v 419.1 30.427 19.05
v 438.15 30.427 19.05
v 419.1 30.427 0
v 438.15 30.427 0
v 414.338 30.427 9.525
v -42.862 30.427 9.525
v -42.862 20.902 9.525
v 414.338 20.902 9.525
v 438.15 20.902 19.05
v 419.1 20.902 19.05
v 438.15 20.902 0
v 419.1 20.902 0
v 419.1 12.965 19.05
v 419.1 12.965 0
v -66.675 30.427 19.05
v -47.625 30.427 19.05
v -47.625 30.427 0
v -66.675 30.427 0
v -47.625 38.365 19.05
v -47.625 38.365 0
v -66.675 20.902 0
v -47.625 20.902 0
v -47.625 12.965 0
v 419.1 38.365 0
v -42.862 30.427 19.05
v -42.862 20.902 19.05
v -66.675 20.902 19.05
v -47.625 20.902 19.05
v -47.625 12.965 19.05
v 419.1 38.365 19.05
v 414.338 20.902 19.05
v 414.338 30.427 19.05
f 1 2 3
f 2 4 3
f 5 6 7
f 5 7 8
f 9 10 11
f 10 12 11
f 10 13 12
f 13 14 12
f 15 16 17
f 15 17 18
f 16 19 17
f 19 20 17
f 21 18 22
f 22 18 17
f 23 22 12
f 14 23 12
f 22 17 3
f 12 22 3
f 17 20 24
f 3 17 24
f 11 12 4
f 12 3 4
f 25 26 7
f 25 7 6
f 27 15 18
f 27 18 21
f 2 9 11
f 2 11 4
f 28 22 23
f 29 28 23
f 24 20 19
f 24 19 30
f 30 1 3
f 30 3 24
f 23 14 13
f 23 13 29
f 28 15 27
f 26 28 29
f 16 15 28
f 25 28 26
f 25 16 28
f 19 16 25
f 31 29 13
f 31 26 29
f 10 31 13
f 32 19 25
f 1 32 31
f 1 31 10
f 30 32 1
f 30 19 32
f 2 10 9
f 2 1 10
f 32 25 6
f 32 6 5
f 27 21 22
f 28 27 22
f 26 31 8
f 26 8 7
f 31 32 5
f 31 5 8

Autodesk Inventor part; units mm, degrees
ref_plane "YZ Plane" through (0, 0, 0) normal (1, 0, 0) x (0, 1, 0)
ref_plane "XZ Plane" through (0, 0, 0) normal (0, 1, 0) x (-1, 0, 0)
ref_plane "XY Plane" through (0, 0, 0) normal (0, 0, 1) x (1, 0, 0)
sketch "Sketch1" plane through (0, 0, 0) normal (0, 0, 1) x (1, 0, 0)
  line L0 (-47.625, 38.3646) -> (-47.625, 30.4271)
  line L1 (-47.625, 30.4271) -> (-66.675, 30.4271)
  line L2 (-66.675, 30.4271) -> (-66.675, 20.9021)
  line L3 (-66.675, 20.9021) -> (-47.625, 20.9021)
  line L4 (-47.625, 20.9021) -> (-47.625, 12.9646)
  line L5 (-47.625, 38.3646) -> (185.7375, 38.3646)
  line L6 (185.7375, 38.3646) -> (185.7375, 12.9646)
  line L7 (185.7375, 12.9646) -> (-47.625, 12.9646)
  line L8 (-47.625, 12.9646) -> (-47.625, 38.3646)
  line L9 (-47.625, 20.9021) -> (-66.675, 20.9021)
  line L10 (-66.675, 20.9021) -> (-66.675, 30.4271)
  line L11 (-66.675, 30.4271) -> (-47.625, 30.4271)
  line L12 (-47.625, 30.4271) -> (-47.625, 20.9021)
  point P0 (0, 0)
  dimension "d0" = 7.9375
  dimension "d1" = 19.05
  dimension "d2" = 9.525
  dimension "d3" = 7.9375
  dimension "d4" = 25.4
  dimension "d6" = 252.4125
extrude "Extrusion1" add sketch "Sketch1" along normal blind 19.05
mirror "Mirror1" about plane through (185.7375, 12.9646, 0) normal (1, 0, 0) of "Extrusion1"
sketch "Sketch2" plane through (0, 0, 19.05) normal (0, 0, 1) x (1, 0, 0)
  line L0 (-66.675, 30.4271) -> (-66.675, 20.9021) projected
  line L1 (-47.625, 12.9646) -> (419.1, 12.9646) projected
  line L2 (438.15, 30.4271) -> (438.15, 20.9021) projected
  line L3 (-47.625, 38.3646) -> (419.1, 38.3646) projected
  line L4 (-42.8625, 30.4271) -> (414.3375, 30.4271)
  line L5 (414.3375, 30.4271) -> (414.3375, 20.9021)
  line L6 (414.3375, 20.9021) -> (-42.8625, 20.9021)
  line L7 (-42.8625, 20.9021) -> (-42.8625, 30.4271)
  point P0 (0, 0)
  dimension "d10" = 7.9375
  dimension "d11" = 7.9375
  dimension "d12" = 9.525
  dimension "d13" = 23.8125
  dimension "d14" = 23.8125
extrude "Extrusion2" cut sketch "Sketch2" against normal blind 9.525
equation "\"d11\" = d10"
properties part number "top_cover_side" material "Wood (Birch)"
